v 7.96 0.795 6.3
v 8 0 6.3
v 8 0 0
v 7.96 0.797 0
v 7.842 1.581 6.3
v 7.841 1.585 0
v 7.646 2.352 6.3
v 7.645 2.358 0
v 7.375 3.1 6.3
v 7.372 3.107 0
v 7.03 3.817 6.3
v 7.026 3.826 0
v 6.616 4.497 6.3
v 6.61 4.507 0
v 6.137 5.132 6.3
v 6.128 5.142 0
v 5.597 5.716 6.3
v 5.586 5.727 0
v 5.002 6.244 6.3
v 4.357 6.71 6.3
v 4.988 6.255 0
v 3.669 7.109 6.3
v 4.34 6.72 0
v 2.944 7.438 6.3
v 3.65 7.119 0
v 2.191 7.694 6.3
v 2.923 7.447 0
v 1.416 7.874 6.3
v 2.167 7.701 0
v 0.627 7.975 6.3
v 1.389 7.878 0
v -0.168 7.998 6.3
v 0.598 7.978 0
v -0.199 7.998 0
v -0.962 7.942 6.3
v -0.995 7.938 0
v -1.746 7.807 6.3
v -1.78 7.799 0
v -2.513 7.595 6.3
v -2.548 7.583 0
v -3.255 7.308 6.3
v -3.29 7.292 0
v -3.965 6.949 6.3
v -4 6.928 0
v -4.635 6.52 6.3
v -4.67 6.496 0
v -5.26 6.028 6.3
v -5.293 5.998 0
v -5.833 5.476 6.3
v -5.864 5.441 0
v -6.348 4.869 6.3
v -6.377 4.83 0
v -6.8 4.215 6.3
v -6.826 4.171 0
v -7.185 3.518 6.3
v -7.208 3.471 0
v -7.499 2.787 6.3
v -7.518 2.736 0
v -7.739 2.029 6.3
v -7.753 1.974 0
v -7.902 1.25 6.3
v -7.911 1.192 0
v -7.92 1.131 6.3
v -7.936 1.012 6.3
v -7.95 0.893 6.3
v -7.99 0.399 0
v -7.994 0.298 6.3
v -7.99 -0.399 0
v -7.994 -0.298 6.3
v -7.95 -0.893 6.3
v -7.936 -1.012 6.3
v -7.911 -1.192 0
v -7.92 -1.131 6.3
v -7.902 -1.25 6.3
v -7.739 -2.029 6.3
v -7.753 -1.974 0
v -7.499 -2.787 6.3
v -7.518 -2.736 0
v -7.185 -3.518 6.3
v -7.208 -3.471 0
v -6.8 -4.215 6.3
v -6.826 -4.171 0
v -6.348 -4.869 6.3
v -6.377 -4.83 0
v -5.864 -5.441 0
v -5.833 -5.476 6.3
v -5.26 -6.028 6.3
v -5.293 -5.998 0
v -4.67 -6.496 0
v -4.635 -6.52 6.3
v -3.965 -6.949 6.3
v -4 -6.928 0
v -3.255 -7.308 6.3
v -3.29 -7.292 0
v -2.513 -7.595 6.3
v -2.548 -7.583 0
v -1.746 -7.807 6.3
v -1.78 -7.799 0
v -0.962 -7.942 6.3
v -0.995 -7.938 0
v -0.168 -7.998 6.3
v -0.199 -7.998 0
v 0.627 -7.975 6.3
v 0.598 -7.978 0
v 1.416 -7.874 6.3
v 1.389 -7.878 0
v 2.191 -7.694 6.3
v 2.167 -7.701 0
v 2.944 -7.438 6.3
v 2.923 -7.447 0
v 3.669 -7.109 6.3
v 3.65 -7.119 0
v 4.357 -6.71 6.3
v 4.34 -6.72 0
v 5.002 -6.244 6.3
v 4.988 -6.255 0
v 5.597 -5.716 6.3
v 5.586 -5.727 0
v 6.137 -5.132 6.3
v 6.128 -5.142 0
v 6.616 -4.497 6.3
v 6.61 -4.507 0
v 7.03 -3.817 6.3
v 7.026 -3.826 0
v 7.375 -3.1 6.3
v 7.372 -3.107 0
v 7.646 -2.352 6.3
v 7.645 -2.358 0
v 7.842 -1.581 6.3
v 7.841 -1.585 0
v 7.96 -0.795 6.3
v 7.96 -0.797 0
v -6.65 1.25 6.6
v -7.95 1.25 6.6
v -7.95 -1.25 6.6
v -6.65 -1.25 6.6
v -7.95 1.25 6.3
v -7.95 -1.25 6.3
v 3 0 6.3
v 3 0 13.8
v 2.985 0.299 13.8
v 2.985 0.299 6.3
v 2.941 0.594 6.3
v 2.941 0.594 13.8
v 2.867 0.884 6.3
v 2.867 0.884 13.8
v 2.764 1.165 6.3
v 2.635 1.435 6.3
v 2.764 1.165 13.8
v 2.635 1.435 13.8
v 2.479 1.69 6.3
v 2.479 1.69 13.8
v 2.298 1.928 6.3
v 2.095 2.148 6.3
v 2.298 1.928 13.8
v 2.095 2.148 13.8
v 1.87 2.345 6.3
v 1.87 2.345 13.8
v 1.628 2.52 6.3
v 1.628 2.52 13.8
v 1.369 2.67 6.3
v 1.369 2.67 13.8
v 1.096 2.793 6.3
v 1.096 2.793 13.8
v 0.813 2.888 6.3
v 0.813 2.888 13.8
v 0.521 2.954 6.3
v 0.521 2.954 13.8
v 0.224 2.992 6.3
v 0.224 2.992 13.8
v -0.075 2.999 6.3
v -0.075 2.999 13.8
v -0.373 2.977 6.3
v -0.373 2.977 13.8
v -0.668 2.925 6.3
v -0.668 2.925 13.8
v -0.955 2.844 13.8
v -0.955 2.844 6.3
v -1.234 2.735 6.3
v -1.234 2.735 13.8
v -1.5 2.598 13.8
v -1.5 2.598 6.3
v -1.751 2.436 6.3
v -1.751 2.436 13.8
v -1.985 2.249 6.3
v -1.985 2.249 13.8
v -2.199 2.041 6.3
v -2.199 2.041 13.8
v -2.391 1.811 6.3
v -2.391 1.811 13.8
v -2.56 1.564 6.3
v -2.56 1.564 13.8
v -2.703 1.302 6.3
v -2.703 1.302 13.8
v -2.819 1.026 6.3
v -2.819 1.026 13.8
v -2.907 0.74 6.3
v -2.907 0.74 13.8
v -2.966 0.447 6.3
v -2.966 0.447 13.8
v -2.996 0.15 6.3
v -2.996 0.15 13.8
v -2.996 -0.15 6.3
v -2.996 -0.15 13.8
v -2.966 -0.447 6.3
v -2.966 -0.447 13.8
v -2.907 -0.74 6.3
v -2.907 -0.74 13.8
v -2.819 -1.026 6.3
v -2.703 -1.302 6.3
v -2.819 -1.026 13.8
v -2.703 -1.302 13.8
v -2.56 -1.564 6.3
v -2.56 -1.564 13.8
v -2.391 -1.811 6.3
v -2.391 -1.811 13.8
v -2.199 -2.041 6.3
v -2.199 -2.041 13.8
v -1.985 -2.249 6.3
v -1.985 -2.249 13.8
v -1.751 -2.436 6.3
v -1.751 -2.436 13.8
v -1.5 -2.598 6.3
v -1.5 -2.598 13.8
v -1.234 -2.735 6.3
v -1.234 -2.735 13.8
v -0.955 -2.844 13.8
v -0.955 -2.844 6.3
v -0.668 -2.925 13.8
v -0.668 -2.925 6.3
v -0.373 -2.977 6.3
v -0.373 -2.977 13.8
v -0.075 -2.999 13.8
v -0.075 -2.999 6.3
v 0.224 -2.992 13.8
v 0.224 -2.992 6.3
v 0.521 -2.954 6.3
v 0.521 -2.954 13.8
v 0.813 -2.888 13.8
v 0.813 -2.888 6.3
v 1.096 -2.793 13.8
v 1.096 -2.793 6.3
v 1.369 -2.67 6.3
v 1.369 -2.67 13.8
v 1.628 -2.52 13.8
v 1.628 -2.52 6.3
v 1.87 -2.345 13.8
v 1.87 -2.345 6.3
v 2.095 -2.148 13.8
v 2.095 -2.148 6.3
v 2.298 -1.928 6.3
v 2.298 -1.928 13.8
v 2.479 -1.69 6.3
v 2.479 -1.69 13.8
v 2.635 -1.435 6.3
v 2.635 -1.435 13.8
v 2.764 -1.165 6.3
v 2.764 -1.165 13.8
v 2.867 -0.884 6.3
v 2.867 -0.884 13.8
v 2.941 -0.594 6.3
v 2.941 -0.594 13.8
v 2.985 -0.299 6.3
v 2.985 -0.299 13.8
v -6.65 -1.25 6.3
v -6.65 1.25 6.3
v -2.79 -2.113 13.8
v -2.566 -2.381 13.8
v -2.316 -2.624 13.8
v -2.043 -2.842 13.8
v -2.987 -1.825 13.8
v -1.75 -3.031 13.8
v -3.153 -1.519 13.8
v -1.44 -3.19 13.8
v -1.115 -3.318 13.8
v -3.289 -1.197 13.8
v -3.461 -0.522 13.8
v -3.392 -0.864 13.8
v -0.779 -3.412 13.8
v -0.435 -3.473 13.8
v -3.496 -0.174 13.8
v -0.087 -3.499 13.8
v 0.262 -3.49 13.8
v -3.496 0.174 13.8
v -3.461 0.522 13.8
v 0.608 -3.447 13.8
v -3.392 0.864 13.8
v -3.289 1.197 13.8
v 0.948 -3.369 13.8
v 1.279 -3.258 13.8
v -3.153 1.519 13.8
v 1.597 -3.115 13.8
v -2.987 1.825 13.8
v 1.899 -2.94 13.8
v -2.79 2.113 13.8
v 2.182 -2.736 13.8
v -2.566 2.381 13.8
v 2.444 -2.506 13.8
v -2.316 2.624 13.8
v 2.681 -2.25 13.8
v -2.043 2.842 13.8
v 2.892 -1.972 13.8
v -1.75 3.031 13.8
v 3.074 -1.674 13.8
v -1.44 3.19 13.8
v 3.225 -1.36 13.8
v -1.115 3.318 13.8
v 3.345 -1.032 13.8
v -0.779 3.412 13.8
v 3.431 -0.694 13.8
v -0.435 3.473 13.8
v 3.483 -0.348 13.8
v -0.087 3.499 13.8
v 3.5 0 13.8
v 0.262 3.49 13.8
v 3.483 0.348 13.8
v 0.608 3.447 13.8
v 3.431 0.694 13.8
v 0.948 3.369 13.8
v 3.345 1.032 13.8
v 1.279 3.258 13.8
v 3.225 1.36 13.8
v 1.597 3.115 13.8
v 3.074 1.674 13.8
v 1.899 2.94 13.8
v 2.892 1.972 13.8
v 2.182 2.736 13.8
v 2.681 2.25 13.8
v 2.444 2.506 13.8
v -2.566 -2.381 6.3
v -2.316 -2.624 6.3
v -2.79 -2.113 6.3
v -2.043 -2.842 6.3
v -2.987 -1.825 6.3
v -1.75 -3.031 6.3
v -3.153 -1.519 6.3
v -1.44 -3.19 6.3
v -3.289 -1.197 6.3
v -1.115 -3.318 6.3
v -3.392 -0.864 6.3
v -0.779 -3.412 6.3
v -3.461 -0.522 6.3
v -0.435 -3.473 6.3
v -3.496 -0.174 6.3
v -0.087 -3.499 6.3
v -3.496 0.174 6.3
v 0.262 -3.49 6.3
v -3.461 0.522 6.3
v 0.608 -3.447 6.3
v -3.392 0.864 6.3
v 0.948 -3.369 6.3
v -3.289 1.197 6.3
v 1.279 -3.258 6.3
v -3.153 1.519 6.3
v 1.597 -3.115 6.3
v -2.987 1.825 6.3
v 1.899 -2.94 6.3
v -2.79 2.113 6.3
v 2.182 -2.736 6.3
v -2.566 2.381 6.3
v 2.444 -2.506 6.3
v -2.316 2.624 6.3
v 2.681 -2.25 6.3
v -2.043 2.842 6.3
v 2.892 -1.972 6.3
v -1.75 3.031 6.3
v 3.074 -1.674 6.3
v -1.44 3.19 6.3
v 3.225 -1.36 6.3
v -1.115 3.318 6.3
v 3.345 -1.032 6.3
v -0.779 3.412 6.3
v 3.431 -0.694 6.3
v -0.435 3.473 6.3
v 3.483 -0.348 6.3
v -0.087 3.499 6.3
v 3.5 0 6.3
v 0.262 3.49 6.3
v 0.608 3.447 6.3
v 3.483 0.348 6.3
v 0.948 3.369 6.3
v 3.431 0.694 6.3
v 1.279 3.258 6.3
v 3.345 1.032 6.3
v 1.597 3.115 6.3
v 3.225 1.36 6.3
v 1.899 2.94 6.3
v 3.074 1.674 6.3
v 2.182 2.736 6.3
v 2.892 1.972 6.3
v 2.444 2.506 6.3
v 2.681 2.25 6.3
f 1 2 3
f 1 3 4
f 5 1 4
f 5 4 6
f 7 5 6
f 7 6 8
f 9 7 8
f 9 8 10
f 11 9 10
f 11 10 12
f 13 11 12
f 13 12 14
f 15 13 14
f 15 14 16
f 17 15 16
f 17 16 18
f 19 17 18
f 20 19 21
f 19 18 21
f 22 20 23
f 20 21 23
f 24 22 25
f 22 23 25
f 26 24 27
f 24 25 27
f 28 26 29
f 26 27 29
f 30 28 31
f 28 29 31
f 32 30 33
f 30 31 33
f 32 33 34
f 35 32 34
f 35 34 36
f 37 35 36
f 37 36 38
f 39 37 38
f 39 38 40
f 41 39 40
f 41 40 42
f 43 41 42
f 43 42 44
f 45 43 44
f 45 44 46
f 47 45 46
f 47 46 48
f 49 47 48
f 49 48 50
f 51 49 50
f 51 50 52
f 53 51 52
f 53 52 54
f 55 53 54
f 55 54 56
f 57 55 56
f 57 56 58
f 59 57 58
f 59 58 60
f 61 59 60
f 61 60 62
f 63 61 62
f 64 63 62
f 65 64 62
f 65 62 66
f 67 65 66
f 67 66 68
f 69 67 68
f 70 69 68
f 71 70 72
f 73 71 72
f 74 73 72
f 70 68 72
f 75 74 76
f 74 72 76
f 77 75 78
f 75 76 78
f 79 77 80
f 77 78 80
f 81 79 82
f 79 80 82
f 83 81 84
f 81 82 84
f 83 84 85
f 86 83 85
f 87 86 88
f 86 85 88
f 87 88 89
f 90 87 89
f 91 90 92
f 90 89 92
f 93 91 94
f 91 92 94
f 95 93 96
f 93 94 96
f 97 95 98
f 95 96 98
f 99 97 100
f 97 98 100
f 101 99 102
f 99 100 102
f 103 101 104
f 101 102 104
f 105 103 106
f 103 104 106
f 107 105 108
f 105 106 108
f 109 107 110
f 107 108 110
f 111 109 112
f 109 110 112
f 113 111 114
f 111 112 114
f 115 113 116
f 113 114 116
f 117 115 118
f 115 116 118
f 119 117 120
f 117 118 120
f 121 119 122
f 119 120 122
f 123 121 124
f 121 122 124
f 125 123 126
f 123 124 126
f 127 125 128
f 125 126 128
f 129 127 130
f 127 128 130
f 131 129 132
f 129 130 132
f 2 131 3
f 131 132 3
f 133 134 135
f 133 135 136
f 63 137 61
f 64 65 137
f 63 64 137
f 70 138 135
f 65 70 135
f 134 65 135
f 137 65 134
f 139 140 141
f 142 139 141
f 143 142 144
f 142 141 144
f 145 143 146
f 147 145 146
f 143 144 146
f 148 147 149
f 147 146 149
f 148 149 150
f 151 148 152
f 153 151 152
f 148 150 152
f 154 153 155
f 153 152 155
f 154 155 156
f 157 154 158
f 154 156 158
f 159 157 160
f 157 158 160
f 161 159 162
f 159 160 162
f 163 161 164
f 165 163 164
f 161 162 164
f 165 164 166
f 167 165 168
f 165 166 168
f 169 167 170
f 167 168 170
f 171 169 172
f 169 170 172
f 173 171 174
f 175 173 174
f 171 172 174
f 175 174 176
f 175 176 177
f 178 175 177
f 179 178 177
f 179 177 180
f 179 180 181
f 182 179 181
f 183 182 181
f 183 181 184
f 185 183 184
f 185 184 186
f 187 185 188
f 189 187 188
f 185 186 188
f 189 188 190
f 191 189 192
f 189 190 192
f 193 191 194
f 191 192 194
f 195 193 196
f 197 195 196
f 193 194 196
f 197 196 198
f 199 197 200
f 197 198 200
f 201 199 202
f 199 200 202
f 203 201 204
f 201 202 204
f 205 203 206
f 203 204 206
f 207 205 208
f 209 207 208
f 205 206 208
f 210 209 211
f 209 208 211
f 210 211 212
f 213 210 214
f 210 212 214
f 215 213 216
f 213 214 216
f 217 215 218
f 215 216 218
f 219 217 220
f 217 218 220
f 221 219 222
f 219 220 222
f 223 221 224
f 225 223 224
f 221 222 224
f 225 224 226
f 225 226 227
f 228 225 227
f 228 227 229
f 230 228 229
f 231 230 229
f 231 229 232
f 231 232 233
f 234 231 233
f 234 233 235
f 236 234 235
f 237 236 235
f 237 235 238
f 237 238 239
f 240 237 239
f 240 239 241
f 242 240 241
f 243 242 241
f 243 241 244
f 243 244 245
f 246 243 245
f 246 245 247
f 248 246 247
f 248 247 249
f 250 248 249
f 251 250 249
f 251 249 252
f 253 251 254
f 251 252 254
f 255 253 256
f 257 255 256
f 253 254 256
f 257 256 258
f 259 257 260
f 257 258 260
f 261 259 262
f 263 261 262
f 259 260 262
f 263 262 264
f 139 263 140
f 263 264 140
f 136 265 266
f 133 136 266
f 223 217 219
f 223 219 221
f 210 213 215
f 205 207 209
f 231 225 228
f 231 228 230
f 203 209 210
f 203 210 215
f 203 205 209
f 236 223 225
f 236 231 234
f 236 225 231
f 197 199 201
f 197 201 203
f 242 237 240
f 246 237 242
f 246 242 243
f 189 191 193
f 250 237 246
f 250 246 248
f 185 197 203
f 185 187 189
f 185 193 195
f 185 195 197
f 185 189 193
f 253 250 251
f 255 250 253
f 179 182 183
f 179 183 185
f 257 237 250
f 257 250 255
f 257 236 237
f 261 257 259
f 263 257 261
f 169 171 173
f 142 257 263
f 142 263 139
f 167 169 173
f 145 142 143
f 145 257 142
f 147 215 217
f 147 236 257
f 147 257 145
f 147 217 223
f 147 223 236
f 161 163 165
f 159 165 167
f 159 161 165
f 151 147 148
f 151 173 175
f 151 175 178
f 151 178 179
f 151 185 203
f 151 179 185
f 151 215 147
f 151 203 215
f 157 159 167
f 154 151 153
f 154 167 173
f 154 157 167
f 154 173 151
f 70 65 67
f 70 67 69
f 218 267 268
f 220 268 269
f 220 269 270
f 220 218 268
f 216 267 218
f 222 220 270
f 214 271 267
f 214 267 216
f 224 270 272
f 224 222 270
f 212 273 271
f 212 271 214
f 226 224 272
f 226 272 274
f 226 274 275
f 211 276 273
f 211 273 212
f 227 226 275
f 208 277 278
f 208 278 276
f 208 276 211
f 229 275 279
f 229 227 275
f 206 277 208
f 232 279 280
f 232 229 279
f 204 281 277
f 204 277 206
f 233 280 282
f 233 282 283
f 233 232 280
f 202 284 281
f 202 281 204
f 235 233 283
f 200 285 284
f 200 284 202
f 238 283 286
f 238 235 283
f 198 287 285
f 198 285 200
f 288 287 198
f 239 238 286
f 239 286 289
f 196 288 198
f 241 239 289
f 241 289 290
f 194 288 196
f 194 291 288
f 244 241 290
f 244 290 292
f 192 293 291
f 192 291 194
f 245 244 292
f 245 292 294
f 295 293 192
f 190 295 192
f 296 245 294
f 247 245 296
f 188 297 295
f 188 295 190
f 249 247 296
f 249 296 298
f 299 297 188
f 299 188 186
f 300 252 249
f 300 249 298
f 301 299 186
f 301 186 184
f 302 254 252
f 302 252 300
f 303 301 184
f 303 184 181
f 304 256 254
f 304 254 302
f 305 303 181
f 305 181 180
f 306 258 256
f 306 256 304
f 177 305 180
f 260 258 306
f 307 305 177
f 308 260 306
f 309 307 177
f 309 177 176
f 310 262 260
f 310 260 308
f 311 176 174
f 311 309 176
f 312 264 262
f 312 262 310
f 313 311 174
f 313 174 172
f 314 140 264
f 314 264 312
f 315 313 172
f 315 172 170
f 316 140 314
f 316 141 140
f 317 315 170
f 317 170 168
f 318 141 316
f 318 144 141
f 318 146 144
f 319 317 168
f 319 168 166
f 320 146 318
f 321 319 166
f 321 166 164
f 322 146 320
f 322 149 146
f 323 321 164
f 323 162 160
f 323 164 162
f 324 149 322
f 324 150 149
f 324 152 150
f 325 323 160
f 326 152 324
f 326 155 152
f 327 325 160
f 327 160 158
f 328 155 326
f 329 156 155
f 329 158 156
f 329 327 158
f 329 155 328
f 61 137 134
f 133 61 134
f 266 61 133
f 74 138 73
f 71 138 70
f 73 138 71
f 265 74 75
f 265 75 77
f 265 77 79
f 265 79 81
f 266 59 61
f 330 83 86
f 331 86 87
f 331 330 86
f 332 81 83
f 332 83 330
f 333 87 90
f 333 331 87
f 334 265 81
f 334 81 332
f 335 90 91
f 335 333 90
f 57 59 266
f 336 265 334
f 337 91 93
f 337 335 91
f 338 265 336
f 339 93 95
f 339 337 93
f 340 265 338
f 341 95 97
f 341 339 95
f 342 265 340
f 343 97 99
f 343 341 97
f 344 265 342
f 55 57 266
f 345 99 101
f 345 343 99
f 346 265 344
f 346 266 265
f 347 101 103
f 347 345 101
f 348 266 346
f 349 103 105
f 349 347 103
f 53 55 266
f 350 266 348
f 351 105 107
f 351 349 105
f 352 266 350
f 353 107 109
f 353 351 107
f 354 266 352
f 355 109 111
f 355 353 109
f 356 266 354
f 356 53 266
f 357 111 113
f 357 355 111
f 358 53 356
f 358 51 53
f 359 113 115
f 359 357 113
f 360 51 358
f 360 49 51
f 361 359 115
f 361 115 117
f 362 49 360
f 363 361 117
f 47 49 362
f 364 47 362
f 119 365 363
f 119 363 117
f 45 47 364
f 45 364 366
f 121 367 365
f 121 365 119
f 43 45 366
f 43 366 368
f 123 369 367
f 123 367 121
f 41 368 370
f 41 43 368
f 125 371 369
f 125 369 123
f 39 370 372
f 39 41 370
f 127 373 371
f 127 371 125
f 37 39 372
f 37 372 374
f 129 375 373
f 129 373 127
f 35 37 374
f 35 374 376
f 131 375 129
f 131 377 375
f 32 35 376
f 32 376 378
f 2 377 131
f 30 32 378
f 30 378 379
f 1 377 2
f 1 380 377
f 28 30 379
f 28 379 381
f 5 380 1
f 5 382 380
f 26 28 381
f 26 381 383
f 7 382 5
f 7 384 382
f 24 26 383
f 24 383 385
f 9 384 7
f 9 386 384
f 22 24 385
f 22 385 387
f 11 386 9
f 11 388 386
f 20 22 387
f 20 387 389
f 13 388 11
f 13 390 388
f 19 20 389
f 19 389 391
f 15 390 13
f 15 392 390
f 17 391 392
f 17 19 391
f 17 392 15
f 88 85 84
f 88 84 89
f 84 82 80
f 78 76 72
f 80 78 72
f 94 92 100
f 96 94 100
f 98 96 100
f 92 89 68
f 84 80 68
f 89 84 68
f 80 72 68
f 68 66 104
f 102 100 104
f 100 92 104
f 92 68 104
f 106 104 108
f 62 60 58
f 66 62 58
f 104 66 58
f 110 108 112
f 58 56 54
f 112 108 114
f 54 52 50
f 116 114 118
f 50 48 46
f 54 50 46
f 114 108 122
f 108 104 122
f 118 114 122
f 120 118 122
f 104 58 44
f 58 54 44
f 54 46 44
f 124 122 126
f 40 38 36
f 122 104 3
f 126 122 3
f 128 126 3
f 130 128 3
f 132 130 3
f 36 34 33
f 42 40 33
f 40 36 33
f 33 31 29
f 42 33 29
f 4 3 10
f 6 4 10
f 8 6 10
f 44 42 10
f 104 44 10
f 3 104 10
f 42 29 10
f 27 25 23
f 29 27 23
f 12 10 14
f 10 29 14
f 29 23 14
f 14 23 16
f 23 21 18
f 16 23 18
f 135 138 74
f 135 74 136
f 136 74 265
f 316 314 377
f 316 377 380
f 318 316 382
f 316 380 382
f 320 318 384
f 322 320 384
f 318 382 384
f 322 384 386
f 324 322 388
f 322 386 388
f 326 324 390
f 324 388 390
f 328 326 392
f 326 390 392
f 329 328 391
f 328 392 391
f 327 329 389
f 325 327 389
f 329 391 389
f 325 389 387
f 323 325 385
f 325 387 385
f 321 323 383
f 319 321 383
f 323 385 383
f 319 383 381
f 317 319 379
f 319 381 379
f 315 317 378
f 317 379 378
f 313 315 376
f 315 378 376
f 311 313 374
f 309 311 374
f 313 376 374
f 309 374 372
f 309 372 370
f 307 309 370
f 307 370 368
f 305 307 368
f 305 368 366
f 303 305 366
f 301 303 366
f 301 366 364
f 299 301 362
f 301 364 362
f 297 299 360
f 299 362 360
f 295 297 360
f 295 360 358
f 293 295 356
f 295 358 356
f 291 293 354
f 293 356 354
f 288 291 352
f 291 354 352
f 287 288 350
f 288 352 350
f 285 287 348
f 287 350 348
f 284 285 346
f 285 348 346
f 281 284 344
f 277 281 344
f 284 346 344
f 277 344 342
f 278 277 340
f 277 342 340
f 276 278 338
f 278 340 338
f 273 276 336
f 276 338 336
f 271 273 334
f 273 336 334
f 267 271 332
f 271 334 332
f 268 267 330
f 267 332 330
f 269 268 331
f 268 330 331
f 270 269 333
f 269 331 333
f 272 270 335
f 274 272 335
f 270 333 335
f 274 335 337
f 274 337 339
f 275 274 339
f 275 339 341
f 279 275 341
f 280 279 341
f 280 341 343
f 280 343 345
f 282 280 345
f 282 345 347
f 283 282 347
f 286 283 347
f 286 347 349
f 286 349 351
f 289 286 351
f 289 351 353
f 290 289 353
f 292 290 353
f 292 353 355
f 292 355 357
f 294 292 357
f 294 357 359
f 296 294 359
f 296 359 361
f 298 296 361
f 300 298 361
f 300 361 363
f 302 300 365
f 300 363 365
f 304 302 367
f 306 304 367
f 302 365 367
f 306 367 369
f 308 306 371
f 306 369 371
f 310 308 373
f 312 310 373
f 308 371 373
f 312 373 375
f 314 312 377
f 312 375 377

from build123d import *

# Parameters (mm, degrees)
SKETCH1_R           = 8
BOSS_EXTRUDE1_DEPTH = 6.3
SKETCH2_R           = 3.5
BOSS_EXTRUDE2_DEPTH = 7.5
SKETCH3_R           = 3
CUT_EXTRUDE1_DEPTH  = 7.5
SKETCH5_W           = 1.3
SKETCH5_H           = 2.5
BOSS_EXTRUDE3_DEPTH = 0.3


with BuildPart() as part:
    # Sketch1 → Boss-Extrude1 (new body)
    with BuildSketch(Plane.XY):
        Circle(SKETCH1_R)
    extrude(amount=BOSS_EXTRUDE1_DEPTH)

    # Sketch2 → Boss-Extrude2 (add)
    with BuildSketch(Plane.XY.offset(6.3)):
        Circle(SKETCH2_R)
    extrude(amount=BOSS_EXTRUDE2_DEPTH)

    # Sketch3 → Cut-Extrude1 (cut)
    with BuildSketch(Plane.XY.offset(13.8)):
        Circle(SKETCH3_R)
    extrude(amount=-CUT_EXTRUDE1_DEPTH, mode=Mode.SUBTRACT)

    # Sketch5 → Boss-Extrude3 (add)
    with BuildSketch(Plane.XY.offset(6.3)):
        with Locations((-7.3, 0)):
            Rectangle(SKETCH5_W, SKETCH5_H)
    extrude(amount=BOSS_EXTRUDE3_DEPTH)


solid = part.part
